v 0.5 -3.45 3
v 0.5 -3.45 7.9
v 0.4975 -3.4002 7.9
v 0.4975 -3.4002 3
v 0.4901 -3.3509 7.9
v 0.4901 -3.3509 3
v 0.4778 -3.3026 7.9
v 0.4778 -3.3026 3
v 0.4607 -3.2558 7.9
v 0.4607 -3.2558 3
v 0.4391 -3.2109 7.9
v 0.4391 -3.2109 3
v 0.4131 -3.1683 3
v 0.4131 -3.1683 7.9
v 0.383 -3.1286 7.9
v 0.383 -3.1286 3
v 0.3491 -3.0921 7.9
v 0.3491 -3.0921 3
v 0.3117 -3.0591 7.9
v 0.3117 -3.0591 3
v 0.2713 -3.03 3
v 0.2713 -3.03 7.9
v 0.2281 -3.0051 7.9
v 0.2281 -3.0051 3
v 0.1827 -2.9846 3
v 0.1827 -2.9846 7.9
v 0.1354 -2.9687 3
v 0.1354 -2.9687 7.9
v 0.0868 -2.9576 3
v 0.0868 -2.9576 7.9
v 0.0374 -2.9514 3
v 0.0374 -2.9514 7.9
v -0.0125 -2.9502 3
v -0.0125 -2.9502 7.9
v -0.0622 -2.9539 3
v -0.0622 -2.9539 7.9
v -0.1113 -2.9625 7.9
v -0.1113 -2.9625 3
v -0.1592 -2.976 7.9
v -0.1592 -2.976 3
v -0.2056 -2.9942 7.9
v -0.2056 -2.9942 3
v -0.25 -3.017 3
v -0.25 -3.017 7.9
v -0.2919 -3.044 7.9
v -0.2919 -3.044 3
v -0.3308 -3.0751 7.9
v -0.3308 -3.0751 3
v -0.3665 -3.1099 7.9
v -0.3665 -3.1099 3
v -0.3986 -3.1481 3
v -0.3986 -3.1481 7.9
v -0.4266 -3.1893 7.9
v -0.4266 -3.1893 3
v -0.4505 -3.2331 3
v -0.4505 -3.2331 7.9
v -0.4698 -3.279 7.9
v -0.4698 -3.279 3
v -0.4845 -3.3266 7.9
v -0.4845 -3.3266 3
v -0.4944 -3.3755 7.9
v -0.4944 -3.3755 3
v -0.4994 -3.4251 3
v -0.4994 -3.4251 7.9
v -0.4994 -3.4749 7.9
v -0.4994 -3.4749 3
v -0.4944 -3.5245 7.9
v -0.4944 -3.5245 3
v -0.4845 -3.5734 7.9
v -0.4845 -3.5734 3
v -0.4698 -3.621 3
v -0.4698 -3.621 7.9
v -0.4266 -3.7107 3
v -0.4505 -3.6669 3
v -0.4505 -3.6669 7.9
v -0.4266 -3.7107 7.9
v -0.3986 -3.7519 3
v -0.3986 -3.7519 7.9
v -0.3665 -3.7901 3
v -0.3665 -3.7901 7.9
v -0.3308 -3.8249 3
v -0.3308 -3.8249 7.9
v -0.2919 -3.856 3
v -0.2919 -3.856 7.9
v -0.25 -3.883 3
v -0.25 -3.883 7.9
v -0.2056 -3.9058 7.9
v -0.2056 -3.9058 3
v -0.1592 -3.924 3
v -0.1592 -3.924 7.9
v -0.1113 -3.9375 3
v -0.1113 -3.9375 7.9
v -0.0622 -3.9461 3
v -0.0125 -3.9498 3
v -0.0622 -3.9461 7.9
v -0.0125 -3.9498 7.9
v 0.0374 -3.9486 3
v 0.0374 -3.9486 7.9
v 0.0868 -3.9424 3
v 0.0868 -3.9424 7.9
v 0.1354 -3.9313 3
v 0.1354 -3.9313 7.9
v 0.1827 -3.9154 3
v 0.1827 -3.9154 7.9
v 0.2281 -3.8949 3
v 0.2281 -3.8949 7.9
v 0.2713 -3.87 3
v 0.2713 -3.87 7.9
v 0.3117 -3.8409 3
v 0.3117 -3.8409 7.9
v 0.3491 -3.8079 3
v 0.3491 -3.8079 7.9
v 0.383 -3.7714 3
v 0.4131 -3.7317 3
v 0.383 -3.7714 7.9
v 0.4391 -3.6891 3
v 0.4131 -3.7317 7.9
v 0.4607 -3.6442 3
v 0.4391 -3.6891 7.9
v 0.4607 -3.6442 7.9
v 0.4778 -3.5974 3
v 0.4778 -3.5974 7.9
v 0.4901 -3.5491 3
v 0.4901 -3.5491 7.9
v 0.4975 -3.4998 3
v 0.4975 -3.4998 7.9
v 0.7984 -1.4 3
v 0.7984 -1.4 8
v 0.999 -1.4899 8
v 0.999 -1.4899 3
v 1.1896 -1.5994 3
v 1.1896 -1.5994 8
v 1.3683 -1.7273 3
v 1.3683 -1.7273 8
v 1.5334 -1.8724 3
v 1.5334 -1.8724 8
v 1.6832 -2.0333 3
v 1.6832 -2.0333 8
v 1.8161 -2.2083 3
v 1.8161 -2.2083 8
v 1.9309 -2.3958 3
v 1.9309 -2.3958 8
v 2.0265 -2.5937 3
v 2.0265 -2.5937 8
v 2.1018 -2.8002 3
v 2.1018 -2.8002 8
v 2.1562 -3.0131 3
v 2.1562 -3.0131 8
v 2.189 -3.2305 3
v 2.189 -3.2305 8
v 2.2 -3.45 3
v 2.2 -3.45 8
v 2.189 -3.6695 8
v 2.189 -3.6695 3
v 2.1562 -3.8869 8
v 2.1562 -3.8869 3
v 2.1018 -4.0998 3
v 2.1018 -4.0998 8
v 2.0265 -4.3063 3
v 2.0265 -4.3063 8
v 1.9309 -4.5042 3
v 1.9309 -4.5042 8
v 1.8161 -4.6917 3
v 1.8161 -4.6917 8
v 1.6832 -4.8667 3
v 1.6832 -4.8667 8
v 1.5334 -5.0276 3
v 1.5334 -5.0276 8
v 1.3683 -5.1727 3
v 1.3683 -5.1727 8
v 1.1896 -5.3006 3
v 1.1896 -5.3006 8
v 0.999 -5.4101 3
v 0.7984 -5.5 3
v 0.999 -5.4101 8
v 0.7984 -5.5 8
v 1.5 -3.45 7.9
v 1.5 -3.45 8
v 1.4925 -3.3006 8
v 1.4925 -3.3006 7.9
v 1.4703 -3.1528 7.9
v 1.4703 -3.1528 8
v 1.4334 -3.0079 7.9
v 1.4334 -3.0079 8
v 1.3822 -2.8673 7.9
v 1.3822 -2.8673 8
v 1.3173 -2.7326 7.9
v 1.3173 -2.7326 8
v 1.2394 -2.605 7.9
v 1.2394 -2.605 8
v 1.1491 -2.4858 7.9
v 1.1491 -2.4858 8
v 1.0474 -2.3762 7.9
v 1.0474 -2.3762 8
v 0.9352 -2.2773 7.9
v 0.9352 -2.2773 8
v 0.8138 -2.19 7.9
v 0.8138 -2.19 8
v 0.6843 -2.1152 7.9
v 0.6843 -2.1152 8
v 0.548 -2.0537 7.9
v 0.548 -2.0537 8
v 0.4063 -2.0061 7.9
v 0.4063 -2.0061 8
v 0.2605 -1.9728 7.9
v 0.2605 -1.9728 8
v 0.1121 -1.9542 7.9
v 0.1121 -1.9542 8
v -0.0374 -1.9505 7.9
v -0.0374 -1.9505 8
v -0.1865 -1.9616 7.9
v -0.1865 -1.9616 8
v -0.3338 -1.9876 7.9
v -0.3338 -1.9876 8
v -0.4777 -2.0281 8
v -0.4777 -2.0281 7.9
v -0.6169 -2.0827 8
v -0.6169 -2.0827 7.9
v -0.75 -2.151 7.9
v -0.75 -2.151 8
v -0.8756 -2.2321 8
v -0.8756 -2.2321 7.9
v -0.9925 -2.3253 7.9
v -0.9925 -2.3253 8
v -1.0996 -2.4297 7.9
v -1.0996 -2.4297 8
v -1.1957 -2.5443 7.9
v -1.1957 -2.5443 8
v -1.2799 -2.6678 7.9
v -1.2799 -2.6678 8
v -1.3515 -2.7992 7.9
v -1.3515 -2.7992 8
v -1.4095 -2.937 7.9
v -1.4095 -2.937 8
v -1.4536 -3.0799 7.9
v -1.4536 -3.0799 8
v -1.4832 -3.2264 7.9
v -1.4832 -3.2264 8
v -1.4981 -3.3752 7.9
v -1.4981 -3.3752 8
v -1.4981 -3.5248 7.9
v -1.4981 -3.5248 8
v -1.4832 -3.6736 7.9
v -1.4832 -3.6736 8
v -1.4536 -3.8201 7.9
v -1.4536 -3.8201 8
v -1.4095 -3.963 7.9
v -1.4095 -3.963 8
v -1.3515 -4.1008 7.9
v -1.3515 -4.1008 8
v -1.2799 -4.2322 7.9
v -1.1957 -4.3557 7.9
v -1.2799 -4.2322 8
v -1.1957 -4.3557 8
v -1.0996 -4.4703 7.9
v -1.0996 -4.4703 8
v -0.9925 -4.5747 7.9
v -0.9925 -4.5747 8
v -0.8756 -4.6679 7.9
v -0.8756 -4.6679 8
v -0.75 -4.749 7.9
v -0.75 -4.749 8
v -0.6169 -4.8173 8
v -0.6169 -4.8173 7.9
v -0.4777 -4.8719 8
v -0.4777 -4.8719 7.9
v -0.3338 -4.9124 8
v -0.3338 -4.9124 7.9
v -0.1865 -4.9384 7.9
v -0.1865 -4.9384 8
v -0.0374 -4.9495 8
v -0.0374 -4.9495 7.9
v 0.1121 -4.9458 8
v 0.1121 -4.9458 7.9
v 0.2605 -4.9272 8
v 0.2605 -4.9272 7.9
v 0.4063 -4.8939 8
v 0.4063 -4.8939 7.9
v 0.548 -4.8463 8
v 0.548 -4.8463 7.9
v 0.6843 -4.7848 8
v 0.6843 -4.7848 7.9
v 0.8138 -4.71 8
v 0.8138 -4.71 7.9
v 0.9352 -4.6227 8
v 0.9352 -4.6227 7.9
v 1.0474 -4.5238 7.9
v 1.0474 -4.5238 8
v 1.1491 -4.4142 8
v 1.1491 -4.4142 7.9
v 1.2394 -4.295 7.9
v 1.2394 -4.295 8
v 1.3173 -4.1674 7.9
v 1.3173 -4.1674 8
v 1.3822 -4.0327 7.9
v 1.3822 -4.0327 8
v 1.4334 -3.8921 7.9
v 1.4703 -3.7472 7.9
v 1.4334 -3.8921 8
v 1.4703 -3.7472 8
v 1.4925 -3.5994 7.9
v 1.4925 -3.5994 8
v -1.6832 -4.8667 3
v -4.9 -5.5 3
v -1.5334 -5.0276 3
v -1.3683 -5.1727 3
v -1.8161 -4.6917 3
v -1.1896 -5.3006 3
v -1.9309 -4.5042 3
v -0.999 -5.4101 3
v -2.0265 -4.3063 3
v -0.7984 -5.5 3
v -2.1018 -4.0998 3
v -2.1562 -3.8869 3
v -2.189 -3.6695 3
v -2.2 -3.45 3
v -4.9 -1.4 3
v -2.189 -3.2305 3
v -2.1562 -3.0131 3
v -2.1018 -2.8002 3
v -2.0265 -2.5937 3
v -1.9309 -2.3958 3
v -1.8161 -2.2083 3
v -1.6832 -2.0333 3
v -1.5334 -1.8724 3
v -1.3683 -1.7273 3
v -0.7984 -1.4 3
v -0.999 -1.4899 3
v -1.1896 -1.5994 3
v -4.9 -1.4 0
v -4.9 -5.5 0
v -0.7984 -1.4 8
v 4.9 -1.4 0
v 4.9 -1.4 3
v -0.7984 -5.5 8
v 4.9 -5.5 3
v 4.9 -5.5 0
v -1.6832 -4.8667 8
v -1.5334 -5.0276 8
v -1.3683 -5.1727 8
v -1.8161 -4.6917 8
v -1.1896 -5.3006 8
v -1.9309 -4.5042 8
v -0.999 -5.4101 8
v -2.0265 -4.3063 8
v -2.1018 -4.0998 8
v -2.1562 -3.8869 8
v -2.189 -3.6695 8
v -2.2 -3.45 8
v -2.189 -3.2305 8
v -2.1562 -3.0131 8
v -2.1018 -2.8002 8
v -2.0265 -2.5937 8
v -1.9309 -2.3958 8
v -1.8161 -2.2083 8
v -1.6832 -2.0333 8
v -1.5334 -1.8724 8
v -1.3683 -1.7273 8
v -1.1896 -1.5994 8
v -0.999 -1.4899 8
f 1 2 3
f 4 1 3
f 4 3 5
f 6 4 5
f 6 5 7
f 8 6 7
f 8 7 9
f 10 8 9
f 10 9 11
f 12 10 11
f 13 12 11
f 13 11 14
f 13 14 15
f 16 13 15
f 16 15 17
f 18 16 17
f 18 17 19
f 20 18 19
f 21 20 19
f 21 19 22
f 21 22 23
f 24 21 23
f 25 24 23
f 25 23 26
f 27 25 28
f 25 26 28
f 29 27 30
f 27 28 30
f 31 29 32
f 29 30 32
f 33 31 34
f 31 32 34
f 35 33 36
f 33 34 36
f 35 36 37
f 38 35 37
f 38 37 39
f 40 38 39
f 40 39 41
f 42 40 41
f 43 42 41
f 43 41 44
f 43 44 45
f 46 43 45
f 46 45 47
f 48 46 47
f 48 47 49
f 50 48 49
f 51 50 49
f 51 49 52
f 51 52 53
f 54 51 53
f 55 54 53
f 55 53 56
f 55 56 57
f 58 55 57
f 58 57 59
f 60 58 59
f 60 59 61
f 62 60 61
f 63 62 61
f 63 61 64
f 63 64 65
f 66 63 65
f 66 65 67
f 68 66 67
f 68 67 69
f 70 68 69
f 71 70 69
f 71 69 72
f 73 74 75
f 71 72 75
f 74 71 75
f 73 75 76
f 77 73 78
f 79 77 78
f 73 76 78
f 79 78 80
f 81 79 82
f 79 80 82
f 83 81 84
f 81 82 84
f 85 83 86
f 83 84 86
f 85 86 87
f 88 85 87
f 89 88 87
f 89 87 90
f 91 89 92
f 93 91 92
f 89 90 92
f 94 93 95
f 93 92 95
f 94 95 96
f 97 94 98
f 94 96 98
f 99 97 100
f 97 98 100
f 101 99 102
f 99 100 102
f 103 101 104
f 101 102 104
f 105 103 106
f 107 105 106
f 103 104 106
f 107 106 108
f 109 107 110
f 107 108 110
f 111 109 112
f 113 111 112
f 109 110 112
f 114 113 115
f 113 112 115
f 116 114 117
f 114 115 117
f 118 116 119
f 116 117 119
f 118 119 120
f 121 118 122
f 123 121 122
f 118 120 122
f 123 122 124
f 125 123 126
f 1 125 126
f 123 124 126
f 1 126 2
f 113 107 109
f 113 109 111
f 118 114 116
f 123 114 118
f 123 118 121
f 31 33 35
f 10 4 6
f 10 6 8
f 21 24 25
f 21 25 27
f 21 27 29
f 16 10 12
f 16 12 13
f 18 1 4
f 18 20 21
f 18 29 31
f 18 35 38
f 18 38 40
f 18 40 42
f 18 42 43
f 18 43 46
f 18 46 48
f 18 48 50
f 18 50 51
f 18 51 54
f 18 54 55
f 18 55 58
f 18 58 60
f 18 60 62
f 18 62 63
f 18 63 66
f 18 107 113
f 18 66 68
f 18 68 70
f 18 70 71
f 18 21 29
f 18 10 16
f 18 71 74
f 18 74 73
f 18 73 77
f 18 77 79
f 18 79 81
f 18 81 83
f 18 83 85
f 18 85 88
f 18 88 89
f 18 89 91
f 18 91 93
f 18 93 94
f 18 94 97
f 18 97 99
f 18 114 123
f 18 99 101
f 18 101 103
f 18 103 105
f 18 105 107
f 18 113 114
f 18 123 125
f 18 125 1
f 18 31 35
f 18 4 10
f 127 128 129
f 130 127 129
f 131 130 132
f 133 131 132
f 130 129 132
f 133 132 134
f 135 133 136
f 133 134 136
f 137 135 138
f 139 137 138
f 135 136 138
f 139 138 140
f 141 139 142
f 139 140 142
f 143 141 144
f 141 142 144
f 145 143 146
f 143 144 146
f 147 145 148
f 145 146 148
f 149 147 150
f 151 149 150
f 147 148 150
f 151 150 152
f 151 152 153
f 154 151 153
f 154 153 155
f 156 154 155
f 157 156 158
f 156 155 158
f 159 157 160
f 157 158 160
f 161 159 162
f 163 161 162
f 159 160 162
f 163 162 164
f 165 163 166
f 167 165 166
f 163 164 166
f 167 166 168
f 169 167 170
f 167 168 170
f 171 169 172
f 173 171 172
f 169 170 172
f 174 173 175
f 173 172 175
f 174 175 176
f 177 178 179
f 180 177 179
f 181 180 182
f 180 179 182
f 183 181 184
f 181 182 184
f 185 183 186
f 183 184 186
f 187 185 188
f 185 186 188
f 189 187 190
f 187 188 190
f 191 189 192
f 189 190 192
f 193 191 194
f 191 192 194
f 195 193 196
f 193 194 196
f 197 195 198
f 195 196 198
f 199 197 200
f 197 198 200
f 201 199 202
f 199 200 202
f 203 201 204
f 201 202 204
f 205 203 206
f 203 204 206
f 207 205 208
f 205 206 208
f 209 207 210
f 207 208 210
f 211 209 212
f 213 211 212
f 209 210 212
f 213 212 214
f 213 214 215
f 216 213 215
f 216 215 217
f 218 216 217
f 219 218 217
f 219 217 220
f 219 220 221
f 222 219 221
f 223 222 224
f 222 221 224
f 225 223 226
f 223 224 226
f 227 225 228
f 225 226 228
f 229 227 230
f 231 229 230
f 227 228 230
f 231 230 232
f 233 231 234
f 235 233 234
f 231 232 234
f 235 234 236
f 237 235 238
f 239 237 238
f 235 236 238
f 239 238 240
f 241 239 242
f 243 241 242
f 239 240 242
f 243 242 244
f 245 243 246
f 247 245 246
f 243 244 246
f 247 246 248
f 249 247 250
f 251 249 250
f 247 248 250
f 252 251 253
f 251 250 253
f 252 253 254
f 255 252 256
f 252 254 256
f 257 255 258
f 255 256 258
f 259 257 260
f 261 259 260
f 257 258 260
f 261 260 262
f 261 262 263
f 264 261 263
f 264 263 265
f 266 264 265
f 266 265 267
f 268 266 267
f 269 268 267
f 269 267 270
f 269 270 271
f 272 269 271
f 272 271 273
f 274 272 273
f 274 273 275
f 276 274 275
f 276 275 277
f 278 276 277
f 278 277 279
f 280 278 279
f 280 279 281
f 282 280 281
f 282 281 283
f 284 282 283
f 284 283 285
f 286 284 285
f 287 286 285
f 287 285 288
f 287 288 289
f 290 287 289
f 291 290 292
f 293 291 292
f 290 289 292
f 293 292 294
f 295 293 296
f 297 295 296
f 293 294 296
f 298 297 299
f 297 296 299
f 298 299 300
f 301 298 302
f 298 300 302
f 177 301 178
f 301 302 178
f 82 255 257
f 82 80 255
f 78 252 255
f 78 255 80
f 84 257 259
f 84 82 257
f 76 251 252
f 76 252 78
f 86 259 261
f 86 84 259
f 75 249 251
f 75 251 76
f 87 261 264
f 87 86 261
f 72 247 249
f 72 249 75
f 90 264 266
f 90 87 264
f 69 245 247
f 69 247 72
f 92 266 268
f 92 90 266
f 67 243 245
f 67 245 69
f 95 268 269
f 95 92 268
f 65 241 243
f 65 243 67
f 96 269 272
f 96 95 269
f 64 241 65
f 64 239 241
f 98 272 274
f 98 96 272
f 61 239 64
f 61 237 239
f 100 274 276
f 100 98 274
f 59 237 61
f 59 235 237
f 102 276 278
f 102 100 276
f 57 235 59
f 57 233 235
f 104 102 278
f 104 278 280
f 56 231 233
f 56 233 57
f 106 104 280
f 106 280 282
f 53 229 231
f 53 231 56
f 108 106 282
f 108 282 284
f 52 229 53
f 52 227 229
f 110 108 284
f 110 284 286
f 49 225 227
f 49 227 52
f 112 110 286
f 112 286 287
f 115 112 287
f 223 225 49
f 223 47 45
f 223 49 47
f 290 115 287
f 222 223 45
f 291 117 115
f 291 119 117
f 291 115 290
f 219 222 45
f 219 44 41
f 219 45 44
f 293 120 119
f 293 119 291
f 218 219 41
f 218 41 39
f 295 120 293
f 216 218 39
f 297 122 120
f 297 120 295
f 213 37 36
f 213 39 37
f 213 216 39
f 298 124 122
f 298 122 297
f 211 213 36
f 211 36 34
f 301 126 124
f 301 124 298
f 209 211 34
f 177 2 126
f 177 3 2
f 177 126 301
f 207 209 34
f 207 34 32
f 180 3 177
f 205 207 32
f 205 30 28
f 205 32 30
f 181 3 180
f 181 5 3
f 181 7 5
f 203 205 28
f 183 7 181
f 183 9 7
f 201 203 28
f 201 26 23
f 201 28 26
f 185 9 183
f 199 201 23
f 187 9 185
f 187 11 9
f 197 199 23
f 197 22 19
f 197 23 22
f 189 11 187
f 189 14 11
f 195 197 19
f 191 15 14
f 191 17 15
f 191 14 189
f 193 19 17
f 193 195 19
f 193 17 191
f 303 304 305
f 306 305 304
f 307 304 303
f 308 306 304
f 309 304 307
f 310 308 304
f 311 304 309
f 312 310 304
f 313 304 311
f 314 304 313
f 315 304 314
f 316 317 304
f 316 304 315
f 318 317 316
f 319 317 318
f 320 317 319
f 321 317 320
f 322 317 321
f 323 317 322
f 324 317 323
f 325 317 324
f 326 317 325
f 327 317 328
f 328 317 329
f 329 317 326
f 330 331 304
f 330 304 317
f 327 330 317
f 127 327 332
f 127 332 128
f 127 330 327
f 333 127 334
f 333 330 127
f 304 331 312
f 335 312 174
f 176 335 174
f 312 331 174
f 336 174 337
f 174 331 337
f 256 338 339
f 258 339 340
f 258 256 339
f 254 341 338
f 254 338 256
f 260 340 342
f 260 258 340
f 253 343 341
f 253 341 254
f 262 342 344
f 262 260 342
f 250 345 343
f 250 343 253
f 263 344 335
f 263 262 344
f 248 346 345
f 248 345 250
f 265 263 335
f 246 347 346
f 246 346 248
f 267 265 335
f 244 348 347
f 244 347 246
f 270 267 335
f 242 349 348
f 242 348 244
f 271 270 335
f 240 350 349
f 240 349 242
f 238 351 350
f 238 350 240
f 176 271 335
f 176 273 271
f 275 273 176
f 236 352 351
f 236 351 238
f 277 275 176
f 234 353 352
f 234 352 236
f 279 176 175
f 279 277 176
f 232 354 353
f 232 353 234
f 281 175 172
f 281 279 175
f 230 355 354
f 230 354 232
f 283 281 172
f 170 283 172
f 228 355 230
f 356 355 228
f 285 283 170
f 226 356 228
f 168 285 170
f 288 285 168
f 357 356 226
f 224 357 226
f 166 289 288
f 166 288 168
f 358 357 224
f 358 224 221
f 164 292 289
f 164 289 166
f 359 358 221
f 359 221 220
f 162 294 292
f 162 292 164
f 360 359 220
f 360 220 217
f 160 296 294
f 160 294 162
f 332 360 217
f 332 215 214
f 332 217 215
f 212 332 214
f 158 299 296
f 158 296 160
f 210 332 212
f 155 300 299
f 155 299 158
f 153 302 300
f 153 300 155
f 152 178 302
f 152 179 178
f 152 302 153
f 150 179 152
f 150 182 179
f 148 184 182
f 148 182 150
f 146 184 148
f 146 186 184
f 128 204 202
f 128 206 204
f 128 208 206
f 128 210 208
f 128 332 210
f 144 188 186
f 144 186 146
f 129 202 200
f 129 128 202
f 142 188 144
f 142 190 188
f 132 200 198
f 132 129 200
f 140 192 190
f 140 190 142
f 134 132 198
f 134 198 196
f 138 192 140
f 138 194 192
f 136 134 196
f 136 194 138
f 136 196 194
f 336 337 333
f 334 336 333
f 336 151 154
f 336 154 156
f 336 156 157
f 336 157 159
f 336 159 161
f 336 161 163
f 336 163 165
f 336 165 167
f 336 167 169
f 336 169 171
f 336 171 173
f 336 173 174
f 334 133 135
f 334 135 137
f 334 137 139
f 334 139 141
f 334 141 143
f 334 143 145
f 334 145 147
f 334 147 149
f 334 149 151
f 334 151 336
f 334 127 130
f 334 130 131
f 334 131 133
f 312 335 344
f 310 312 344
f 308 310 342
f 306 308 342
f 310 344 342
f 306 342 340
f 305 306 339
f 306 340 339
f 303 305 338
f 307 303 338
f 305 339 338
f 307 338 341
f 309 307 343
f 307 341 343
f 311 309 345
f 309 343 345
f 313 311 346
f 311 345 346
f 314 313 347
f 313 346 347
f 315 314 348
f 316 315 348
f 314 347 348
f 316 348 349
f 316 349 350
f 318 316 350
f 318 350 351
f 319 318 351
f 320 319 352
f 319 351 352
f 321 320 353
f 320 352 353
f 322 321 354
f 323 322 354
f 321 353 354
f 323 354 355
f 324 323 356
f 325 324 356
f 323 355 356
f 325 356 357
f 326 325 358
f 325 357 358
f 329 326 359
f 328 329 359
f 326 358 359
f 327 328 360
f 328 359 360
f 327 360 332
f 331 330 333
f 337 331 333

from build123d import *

# Parameters (mm, degrees)
COMPONENT_OUTLINE_W = 9.8
COMPONENT_OUTLINE_H = 4.1
EXTRUDE1_DEPTH      = 8
CUT_EXTRUDE1_DEPTH  = 5
SKETCH3_R           = 0.5
CUT_EXTRUDE2_DEPTH  = 5
SKETCH4_R           = 1.5
CUT_EXTRUDE3_DEPTH  = 0.1


with BuildPart() as part:
    # COMPONENT_OUTLINE → Extrude1 (new body)
    with BuildSketch(Plane.XY):
        with Locations((0, -3.45)):
            Rectangle(COMPONENT_OUTLINE_W, COMPONENT_OUTLINE_H)
    extrude(amount=EXTRUDE1_DEPTH)

    # Sketch1 → Cut-Extrude1 (cut)
    with BuildSketch(Plane.XY.offset(8)):
        with BuildLine():
            Line((0.798435971, -5.5), (4.9, -5.5))
            Line((4.9, -5.5), (4.9, -1.4))
            Line((4.9, -1.4), (0.798435971, -1.4))
            ThreePointArc((0.798435971, -1.4), (2.2, -3.45), (0.798435971, -5.5))
        make_face()
        with BuildLine():
            Line((-0.798435971, -1.4), (-4.9, -1.4))
            Line((-4.9, -1.4), (-4.9, -5.5))
            Line((-4.9, -5.5), (-0.798435971, -5.5))
            ThreePointArc((-0.798435971, -5.5), (-2.2, -3.45), (-0.798435971, -1.4))
        make_face()
    extrude(amount=-CUT_EXTRUDE1_DEPTH, mode=Mode.SUBTRACT)

    # Sketch3 → Cut-Extrude2 (cut)
    with BuildSketch(Plane.XY.offset(8)):
        with Locations((0, -3.45)):
            Circle(SKETCH3_R)
    extrude(amount=-CUT_EXTRUDE2_DEPTH, mode=Mode.SUBTRACT)

    # Sketch4 → Cut-Extrude3 (cut)
    with BuildSketch(Plane.XY.offset(8)):
        with Locations((0, -3.45)):
            Circle(SKETCH4_R)
    extrude(amount=-CUT_EXTRUDE3_DEPTH, mode=Mode.SUBTRACT)


solid = part.part
